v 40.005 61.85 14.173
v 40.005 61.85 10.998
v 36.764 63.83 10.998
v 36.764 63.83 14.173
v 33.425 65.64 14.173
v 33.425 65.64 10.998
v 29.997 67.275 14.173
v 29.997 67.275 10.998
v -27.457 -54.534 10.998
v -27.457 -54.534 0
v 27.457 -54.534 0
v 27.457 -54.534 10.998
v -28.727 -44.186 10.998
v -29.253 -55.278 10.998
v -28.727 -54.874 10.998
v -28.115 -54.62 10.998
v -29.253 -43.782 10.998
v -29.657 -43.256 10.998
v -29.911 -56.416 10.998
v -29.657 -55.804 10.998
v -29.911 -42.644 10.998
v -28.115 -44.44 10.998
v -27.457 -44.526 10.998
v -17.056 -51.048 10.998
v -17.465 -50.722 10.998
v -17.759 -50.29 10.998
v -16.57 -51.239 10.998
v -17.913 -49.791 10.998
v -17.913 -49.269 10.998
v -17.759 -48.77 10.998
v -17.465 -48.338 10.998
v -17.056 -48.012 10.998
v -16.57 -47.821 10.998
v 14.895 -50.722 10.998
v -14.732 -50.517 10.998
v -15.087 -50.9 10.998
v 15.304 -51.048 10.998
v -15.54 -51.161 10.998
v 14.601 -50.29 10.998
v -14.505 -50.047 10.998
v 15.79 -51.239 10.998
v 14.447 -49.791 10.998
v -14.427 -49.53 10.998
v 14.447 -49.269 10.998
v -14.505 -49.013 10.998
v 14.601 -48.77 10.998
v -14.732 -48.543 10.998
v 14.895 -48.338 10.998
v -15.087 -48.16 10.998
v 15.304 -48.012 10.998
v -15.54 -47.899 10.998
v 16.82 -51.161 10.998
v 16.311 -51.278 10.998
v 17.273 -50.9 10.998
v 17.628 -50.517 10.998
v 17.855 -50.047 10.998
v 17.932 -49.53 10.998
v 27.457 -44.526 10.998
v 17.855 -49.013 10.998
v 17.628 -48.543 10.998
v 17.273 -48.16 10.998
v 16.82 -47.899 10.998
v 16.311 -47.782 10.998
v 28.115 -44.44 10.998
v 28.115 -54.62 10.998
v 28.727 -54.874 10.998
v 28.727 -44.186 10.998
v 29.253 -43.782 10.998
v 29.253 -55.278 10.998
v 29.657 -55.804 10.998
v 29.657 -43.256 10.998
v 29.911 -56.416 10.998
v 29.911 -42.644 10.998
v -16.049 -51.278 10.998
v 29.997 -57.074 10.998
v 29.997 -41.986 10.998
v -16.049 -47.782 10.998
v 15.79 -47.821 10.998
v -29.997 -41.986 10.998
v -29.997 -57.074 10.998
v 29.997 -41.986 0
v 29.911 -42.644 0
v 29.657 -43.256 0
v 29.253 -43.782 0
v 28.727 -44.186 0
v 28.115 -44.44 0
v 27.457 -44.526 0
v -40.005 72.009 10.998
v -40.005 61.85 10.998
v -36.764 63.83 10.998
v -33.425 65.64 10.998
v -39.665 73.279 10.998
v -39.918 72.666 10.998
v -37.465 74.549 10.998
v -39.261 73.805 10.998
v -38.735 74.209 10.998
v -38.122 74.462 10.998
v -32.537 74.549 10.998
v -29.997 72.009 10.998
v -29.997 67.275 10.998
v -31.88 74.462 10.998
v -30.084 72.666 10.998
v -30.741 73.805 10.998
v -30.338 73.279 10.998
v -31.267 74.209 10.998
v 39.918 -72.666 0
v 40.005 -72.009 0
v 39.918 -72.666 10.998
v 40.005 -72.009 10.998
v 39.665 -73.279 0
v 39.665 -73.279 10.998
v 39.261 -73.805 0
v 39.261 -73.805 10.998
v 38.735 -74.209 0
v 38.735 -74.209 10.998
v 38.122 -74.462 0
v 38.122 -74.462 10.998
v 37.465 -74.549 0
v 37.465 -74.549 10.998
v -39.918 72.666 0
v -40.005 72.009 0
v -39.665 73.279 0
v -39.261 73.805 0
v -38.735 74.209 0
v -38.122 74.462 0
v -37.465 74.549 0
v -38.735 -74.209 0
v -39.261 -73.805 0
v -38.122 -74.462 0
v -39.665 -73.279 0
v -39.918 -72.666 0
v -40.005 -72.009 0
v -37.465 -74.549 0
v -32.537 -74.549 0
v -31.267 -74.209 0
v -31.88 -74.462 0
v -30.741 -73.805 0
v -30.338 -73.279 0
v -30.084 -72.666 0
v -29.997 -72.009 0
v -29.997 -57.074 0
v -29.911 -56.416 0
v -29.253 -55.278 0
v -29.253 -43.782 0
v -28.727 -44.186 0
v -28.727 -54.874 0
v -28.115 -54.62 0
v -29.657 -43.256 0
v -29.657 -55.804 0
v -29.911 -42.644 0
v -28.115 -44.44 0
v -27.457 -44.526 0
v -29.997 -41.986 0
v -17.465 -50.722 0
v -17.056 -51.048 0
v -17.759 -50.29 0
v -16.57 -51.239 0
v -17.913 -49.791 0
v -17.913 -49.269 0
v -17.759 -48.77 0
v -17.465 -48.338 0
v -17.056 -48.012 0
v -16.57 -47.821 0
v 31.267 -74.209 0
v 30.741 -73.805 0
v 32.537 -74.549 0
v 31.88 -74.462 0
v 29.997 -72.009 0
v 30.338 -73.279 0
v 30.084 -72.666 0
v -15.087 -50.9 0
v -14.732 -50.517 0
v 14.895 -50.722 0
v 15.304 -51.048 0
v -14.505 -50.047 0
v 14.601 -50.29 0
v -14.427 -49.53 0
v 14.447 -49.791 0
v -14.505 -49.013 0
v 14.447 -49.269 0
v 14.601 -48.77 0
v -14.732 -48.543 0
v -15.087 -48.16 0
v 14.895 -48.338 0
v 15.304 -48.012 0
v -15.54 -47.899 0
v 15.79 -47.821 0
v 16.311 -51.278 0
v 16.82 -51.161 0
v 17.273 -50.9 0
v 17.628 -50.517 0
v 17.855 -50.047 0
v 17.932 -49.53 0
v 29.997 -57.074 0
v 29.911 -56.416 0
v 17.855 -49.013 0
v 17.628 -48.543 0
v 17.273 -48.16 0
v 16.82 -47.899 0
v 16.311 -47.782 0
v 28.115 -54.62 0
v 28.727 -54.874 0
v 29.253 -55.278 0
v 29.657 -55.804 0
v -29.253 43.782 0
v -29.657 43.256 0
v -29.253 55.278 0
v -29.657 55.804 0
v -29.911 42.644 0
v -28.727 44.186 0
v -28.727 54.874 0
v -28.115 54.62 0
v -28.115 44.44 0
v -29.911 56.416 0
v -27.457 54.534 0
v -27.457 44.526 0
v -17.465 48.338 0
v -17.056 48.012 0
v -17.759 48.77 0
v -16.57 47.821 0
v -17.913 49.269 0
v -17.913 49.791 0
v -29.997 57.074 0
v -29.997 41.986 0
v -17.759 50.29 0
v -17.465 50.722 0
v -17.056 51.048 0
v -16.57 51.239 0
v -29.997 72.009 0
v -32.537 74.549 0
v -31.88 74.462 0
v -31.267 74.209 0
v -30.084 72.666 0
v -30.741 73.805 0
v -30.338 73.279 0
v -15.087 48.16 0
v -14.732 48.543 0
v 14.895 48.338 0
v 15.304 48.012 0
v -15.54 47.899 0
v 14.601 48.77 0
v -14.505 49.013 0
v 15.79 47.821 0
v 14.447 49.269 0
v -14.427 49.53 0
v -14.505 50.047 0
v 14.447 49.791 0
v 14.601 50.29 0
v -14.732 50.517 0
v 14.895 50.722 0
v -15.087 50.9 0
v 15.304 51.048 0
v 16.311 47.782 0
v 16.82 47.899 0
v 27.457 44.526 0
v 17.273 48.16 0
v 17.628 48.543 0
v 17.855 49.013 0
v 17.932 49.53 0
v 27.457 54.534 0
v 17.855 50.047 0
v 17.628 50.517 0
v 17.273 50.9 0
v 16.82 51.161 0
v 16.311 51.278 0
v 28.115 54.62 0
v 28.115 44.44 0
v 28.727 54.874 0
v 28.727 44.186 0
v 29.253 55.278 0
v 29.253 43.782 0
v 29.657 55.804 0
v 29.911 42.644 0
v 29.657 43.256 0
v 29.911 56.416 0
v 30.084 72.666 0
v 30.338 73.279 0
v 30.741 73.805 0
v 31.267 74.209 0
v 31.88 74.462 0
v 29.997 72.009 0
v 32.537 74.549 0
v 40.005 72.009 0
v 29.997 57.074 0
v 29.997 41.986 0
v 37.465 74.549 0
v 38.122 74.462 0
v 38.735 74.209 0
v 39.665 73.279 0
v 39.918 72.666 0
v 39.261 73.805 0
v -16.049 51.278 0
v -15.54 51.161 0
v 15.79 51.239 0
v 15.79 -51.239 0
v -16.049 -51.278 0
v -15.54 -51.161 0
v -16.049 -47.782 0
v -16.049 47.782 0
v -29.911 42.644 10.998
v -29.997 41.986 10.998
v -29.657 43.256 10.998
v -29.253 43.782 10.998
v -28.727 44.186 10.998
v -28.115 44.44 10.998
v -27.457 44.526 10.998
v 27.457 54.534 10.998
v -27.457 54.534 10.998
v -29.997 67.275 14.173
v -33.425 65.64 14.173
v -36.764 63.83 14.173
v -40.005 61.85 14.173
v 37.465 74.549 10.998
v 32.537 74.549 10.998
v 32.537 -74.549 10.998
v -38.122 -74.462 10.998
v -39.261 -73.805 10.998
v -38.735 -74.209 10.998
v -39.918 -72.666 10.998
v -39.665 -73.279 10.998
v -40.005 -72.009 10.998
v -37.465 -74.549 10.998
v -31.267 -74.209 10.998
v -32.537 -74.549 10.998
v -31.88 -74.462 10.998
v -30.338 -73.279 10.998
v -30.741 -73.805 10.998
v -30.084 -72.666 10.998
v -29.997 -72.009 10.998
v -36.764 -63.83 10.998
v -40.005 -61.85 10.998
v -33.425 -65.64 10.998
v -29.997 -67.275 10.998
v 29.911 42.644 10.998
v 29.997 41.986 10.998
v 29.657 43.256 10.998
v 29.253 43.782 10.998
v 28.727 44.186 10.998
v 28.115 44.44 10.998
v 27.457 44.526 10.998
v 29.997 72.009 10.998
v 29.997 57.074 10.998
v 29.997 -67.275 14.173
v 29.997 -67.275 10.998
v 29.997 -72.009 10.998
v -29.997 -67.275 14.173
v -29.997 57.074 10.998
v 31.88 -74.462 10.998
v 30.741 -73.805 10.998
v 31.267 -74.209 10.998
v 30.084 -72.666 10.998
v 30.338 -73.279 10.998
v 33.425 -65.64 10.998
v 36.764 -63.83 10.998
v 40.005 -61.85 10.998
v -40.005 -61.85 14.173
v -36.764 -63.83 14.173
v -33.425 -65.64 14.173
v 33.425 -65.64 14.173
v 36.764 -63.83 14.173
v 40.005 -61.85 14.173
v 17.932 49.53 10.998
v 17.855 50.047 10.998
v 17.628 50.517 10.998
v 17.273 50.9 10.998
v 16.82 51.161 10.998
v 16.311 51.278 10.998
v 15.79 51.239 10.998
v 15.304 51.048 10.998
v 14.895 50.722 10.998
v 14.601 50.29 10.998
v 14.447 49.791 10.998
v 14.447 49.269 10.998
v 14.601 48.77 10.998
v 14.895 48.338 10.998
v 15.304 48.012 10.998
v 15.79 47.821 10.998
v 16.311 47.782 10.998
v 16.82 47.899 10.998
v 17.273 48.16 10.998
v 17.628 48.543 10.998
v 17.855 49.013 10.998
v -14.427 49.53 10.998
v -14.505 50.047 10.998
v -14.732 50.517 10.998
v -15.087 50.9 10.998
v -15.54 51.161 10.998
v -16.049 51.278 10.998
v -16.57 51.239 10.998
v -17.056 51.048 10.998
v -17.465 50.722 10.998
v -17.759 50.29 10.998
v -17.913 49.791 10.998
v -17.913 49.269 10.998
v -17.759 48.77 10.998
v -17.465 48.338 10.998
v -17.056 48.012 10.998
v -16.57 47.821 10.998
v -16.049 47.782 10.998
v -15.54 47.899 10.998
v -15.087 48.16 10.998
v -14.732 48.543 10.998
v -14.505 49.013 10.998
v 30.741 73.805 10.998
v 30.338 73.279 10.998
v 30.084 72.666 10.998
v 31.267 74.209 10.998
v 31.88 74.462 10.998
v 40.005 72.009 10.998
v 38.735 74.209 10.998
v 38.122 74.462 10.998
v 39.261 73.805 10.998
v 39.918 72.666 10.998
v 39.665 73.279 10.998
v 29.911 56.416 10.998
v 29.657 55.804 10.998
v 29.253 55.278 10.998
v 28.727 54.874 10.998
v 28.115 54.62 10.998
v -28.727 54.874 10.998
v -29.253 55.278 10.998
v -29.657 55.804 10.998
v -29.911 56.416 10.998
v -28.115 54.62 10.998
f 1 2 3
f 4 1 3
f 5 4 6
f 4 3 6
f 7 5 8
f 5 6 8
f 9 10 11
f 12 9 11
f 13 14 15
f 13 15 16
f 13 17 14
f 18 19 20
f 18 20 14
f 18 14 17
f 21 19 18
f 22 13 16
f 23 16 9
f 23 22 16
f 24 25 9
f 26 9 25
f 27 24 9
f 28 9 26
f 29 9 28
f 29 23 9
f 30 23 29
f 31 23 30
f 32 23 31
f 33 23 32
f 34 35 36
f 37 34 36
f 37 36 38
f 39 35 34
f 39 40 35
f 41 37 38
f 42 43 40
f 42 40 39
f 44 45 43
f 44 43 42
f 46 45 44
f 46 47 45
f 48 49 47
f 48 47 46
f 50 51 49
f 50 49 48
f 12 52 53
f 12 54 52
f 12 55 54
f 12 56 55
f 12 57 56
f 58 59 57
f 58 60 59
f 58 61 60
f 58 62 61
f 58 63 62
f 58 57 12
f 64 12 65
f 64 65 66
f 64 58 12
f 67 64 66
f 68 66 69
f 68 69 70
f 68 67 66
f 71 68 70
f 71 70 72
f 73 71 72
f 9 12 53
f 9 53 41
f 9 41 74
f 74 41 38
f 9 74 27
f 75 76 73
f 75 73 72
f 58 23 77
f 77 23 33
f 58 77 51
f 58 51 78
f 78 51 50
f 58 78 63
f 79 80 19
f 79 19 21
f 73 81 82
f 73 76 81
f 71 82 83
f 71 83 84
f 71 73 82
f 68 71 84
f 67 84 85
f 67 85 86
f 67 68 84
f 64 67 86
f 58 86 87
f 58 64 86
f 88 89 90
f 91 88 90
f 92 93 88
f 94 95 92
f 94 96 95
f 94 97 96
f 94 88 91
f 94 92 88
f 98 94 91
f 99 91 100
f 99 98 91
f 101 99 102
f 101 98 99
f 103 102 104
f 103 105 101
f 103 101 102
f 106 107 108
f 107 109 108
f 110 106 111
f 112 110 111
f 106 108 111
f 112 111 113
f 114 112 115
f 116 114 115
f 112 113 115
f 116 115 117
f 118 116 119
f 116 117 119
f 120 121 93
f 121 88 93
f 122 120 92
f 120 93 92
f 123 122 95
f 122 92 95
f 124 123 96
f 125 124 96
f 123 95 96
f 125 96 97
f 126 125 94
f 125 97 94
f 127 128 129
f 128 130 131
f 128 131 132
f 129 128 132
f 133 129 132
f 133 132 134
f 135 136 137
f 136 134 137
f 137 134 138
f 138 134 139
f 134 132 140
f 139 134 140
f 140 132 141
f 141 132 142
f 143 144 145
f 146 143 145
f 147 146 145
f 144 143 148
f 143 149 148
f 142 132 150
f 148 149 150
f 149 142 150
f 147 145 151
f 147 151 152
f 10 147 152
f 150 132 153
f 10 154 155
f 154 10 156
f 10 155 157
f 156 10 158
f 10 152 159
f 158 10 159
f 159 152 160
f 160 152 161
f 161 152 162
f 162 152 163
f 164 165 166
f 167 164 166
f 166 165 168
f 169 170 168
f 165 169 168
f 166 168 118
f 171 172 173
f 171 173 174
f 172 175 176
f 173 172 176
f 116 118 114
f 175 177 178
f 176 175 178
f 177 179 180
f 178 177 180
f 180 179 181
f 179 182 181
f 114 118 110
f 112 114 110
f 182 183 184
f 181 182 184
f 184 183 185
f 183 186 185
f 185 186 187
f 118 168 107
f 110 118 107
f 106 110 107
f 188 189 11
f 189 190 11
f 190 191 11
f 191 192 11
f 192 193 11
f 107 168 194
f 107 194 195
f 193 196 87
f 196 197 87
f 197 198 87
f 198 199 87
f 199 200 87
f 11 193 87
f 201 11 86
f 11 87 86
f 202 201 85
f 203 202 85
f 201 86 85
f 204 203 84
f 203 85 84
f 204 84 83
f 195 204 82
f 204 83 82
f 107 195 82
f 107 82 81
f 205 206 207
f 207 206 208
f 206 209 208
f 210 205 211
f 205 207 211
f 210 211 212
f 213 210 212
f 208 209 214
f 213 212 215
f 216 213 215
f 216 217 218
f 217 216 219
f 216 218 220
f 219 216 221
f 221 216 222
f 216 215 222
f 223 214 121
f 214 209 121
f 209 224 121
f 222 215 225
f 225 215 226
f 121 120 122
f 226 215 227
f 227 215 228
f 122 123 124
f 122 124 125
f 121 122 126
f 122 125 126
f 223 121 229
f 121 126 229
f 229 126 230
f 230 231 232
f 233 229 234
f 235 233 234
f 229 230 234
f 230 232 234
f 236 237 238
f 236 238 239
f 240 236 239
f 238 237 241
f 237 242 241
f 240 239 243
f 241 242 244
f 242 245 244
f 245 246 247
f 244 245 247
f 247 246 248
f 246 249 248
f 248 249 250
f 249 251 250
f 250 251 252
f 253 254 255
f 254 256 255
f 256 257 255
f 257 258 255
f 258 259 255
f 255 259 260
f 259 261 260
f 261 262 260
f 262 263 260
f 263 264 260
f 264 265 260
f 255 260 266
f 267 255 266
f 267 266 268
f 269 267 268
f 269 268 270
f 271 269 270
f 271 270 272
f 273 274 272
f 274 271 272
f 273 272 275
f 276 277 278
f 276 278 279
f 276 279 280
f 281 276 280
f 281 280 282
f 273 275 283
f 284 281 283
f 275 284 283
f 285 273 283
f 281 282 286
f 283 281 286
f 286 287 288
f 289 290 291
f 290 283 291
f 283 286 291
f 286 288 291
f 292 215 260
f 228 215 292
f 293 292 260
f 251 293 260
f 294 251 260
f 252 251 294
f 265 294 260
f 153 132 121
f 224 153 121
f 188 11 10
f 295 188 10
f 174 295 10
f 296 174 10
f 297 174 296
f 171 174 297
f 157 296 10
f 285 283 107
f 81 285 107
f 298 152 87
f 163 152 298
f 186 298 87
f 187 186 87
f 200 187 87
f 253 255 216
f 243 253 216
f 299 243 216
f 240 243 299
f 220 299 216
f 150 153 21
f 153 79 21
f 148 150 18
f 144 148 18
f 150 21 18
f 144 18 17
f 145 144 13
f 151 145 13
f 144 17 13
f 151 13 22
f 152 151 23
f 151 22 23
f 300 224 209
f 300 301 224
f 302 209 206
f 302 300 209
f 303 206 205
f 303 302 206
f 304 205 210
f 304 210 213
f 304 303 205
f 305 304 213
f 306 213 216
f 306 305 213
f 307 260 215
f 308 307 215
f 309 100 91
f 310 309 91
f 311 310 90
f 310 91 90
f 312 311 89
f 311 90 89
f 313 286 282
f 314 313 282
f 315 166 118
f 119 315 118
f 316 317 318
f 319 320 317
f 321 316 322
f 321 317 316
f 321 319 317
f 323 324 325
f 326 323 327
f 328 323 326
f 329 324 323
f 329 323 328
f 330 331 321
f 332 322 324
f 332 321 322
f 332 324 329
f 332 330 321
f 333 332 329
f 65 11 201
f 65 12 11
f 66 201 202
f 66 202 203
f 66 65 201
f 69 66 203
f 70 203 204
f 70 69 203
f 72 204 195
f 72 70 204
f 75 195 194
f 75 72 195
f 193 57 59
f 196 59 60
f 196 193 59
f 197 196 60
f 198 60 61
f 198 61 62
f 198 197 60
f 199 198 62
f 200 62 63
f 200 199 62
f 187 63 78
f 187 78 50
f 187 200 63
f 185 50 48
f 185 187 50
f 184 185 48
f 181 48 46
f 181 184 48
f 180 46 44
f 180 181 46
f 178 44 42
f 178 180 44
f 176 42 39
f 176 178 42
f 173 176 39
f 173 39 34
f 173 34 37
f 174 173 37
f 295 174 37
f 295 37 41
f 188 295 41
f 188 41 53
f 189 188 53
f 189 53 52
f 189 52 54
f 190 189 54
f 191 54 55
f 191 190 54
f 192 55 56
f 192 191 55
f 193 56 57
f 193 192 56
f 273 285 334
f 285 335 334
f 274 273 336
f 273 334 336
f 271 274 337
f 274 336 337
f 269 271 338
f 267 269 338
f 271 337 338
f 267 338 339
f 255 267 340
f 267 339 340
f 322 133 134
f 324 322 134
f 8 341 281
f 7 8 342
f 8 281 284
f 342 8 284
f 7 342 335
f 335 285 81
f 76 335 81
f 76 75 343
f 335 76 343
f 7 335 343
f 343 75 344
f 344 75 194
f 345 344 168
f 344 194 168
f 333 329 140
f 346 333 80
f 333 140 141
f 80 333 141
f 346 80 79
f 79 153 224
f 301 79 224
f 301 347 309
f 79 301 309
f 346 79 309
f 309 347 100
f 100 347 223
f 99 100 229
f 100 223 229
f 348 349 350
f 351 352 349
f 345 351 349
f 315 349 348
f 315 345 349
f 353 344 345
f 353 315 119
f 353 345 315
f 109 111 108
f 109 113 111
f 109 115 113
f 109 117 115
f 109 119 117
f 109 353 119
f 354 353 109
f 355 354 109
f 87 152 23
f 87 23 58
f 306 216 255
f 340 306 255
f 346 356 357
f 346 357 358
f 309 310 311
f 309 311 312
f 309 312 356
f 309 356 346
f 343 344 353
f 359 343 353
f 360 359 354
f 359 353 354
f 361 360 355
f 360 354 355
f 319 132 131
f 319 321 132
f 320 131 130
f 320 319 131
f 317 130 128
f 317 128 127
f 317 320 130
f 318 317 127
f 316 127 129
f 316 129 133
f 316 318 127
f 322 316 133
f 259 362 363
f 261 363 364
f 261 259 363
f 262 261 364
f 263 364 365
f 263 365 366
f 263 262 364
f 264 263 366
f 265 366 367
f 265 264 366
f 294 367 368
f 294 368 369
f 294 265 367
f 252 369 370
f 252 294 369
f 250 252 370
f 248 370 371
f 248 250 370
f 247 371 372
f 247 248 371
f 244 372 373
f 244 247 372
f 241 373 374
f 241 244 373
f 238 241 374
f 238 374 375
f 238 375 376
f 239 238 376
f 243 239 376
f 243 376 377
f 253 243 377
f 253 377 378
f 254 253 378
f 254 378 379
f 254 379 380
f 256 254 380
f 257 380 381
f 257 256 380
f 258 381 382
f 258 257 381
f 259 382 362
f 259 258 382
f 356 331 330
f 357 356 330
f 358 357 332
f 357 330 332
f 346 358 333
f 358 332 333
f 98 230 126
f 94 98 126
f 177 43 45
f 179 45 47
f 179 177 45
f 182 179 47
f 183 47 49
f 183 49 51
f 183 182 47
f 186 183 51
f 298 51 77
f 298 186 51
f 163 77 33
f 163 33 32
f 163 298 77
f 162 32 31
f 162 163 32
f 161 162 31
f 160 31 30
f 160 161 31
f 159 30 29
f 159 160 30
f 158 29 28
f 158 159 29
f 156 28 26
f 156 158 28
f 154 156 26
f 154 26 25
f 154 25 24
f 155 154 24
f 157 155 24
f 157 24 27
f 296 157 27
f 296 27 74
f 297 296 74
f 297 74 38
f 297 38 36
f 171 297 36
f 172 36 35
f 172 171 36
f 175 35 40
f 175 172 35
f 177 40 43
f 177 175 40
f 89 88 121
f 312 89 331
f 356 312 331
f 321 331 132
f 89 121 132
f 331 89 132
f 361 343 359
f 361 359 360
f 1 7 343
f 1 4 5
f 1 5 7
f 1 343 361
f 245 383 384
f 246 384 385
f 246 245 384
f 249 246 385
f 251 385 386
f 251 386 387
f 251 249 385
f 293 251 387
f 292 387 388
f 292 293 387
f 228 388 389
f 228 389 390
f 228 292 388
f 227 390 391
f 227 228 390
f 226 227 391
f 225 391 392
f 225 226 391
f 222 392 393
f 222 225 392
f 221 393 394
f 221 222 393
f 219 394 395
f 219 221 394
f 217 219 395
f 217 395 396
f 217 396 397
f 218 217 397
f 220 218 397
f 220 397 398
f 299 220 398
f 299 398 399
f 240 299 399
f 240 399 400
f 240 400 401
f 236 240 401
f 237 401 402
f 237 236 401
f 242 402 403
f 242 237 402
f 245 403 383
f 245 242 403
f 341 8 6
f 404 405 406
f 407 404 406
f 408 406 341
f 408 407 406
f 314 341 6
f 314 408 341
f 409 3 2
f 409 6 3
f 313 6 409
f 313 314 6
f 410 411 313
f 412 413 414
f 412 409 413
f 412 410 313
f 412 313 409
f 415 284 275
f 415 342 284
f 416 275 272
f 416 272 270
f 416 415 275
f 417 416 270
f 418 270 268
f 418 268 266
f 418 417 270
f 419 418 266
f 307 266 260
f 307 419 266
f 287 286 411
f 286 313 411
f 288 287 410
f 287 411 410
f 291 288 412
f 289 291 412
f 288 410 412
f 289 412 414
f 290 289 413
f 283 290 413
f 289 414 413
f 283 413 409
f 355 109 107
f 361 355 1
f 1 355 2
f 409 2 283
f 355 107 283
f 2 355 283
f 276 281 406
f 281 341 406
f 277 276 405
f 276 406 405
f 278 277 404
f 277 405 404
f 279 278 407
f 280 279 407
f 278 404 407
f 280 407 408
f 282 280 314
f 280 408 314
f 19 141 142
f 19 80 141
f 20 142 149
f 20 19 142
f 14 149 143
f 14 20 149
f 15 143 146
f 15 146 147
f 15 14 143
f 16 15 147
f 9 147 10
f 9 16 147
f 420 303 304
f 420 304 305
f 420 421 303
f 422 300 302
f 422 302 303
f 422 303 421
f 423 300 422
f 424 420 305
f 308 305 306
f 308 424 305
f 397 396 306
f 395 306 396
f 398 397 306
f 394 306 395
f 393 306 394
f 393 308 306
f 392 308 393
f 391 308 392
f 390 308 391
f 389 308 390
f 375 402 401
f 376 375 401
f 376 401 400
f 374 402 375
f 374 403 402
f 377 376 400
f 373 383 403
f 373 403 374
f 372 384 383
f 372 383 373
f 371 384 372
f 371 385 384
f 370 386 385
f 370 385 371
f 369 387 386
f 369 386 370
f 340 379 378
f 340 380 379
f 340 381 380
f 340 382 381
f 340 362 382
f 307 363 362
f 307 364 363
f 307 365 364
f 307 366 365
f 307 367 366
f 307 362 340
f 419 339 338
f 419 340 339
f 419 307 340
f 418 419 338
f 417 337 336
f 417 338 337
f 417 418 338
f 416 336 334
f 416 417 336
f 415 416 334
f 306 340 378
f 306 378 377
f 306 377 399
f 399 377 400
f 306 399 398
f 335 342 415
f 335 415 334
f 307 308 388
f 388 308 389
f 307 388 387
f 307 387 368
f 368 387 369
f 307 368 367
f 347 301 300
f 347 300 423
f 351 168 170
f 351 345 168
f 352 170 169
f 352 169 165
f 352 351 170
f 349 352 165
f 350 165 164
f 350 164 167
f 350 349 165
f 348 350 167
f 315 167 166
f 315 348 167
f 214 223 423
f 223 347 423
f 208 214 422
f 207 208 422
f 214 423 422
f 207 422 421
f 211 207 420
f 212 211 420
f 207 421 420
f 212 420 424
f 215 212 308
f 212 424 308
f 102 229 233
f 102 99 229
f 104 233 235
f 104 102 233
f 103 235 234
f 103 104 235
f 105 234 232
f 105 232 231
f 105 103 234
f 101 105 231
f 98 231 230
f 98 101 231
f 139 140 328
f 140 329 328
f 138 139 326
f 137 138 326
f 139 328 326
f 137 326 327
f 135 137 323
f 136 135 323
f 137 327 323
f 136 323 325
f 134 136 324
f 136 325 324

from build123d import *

# Parameters (mm, degrees)
F0_R     = 1.7526
F0_W     = 59.9948
F0_H     = 89.0524
F1_DEPTH = 10.9982
F3_DEPTH = 3.175
F4_R     = 2.54


with BuildPart() as f1:
    # F0 (on Top) → F1 (new body)
    with BuildSketch(Plane.XY):
        Polygon((29.9974, 54.5338), (-29.9974, 54.5338), (-29.9974, 74.549), (-40.005, 74.549), (-40.005, 54.5338), (-40.005, -54.5338), (-40.005, -74.549), (-29.9974, -74.549), (-29.9974, -54.5338), (29.9974, -54.5338), (29.9974, -74.549), (40.005, -74.549), (40.005, -54.5338), (40.005, 54.5338), (40.005, 74.549), (29.9974, 74.549), align=None)
        with Locations((-16.1798, -49.53)):
            Circle(F0_R, mode=Mode.SUBTRACT)
        with Locations((16.1798, -49.53)):
            Circle(F0_R, mode=Mode.SUBTRACT)
        with Locations((-16.1798, 49.53)):
            Circle(F0_R, mode=Mode.SUBTRACT)
        Rectangle(F0_W, F0_H, mode=Mode.SUBTRACT)
        with Locations((16.1798, 49.53)):
            Circle(F0_R, mode=Mode.SUBTRACT)
    extrude(amount=F1_DEPTH)

    # F2 (on face) → F3 (join)
    with BuildSketch(Plane.XY.offset(10.9982)):
        with BuildLine():
            ThreePointArc((-29.9974, 67.275193), (-35.106164, 64.756103), (-40.005, 61.849782))
            Line((-40.005, 61.849782), (-40.005, -61.849782))
            ThreePointArc((-40.005, -61.849782), (-35.106164, -64.756103), (-29.9974, -67.275193))
            Line((-29.9974, -67.275193), (-29.9974, -54.5338))
            Line((-29.9974, -54.5338), (-29.9974, -44.5262))
            Line((-29.9974, -44.5262), (-29.9974, 44.5262))
            Line((-29.9974, 44.5262), (-29.9974, 54.5338))
            Line((-29.9974, 54.5338), (-29.9974, 67.275193))
        make_face()
        with BuildLine():
            Line((29.9974, 67.275193), (29.9974, 54.5338))
            Line((29.9974, 54.5338), (29.9974, 44.5262))
            Line((29.9974, 44.5262), (29.9974, -44.5262))
            Line((29.9974, -44.5262), (29.9974, -54.5338))
            Line((29.9974, -54.5338), (29.9974, -67.275193))
            ThreePointArc((29.9974, -67.275193), (35.106164, -64.756103), (40.005, -61.849782))
            Line((40.005, -61.849782), (40.005, 61.849782))
            ThreePointArc((40.005, 61.849782), (35.106164, 64.756103), (29.9974, 67.275193))
        make_face()
    extrude(amount=F3_DEPTH)

    # F4
    f4_edges = [f1.edges().sort_by_distance(p)[0] for p in [
        (29.9974, 44.5262, 5.4991),
        (-29.9974, 44.5262, 5.4991),
        (29.9974, 54.5338, 5.4991),
        (-29.9974, 54.5338, 5.4991),
        (-29.9974, 74.549, 5.4991),
        (-40.005, 74.549, 5.4991),
        (29.9974, 74.549, 5.4991),
        (40.005, 74.549, 5.4991),
        (29.9974, -74.549, 5.4991),
        (40.005, -74.549, 5.4991),
        (-29.9974, -74.549, 5.4991),
        (-40.005, -74.549, 5.4991),
        (-29.9974, -54.5338, 5.4991),
        (29.9974, -54.5338, 5.4991),
        (29.9974, -44.5262, 5.4991),
        (-29.9974, -44.5262, 5.4991),
    ]]
    fillet(f4_edges, radius=F4_R)


solid = f1.part
